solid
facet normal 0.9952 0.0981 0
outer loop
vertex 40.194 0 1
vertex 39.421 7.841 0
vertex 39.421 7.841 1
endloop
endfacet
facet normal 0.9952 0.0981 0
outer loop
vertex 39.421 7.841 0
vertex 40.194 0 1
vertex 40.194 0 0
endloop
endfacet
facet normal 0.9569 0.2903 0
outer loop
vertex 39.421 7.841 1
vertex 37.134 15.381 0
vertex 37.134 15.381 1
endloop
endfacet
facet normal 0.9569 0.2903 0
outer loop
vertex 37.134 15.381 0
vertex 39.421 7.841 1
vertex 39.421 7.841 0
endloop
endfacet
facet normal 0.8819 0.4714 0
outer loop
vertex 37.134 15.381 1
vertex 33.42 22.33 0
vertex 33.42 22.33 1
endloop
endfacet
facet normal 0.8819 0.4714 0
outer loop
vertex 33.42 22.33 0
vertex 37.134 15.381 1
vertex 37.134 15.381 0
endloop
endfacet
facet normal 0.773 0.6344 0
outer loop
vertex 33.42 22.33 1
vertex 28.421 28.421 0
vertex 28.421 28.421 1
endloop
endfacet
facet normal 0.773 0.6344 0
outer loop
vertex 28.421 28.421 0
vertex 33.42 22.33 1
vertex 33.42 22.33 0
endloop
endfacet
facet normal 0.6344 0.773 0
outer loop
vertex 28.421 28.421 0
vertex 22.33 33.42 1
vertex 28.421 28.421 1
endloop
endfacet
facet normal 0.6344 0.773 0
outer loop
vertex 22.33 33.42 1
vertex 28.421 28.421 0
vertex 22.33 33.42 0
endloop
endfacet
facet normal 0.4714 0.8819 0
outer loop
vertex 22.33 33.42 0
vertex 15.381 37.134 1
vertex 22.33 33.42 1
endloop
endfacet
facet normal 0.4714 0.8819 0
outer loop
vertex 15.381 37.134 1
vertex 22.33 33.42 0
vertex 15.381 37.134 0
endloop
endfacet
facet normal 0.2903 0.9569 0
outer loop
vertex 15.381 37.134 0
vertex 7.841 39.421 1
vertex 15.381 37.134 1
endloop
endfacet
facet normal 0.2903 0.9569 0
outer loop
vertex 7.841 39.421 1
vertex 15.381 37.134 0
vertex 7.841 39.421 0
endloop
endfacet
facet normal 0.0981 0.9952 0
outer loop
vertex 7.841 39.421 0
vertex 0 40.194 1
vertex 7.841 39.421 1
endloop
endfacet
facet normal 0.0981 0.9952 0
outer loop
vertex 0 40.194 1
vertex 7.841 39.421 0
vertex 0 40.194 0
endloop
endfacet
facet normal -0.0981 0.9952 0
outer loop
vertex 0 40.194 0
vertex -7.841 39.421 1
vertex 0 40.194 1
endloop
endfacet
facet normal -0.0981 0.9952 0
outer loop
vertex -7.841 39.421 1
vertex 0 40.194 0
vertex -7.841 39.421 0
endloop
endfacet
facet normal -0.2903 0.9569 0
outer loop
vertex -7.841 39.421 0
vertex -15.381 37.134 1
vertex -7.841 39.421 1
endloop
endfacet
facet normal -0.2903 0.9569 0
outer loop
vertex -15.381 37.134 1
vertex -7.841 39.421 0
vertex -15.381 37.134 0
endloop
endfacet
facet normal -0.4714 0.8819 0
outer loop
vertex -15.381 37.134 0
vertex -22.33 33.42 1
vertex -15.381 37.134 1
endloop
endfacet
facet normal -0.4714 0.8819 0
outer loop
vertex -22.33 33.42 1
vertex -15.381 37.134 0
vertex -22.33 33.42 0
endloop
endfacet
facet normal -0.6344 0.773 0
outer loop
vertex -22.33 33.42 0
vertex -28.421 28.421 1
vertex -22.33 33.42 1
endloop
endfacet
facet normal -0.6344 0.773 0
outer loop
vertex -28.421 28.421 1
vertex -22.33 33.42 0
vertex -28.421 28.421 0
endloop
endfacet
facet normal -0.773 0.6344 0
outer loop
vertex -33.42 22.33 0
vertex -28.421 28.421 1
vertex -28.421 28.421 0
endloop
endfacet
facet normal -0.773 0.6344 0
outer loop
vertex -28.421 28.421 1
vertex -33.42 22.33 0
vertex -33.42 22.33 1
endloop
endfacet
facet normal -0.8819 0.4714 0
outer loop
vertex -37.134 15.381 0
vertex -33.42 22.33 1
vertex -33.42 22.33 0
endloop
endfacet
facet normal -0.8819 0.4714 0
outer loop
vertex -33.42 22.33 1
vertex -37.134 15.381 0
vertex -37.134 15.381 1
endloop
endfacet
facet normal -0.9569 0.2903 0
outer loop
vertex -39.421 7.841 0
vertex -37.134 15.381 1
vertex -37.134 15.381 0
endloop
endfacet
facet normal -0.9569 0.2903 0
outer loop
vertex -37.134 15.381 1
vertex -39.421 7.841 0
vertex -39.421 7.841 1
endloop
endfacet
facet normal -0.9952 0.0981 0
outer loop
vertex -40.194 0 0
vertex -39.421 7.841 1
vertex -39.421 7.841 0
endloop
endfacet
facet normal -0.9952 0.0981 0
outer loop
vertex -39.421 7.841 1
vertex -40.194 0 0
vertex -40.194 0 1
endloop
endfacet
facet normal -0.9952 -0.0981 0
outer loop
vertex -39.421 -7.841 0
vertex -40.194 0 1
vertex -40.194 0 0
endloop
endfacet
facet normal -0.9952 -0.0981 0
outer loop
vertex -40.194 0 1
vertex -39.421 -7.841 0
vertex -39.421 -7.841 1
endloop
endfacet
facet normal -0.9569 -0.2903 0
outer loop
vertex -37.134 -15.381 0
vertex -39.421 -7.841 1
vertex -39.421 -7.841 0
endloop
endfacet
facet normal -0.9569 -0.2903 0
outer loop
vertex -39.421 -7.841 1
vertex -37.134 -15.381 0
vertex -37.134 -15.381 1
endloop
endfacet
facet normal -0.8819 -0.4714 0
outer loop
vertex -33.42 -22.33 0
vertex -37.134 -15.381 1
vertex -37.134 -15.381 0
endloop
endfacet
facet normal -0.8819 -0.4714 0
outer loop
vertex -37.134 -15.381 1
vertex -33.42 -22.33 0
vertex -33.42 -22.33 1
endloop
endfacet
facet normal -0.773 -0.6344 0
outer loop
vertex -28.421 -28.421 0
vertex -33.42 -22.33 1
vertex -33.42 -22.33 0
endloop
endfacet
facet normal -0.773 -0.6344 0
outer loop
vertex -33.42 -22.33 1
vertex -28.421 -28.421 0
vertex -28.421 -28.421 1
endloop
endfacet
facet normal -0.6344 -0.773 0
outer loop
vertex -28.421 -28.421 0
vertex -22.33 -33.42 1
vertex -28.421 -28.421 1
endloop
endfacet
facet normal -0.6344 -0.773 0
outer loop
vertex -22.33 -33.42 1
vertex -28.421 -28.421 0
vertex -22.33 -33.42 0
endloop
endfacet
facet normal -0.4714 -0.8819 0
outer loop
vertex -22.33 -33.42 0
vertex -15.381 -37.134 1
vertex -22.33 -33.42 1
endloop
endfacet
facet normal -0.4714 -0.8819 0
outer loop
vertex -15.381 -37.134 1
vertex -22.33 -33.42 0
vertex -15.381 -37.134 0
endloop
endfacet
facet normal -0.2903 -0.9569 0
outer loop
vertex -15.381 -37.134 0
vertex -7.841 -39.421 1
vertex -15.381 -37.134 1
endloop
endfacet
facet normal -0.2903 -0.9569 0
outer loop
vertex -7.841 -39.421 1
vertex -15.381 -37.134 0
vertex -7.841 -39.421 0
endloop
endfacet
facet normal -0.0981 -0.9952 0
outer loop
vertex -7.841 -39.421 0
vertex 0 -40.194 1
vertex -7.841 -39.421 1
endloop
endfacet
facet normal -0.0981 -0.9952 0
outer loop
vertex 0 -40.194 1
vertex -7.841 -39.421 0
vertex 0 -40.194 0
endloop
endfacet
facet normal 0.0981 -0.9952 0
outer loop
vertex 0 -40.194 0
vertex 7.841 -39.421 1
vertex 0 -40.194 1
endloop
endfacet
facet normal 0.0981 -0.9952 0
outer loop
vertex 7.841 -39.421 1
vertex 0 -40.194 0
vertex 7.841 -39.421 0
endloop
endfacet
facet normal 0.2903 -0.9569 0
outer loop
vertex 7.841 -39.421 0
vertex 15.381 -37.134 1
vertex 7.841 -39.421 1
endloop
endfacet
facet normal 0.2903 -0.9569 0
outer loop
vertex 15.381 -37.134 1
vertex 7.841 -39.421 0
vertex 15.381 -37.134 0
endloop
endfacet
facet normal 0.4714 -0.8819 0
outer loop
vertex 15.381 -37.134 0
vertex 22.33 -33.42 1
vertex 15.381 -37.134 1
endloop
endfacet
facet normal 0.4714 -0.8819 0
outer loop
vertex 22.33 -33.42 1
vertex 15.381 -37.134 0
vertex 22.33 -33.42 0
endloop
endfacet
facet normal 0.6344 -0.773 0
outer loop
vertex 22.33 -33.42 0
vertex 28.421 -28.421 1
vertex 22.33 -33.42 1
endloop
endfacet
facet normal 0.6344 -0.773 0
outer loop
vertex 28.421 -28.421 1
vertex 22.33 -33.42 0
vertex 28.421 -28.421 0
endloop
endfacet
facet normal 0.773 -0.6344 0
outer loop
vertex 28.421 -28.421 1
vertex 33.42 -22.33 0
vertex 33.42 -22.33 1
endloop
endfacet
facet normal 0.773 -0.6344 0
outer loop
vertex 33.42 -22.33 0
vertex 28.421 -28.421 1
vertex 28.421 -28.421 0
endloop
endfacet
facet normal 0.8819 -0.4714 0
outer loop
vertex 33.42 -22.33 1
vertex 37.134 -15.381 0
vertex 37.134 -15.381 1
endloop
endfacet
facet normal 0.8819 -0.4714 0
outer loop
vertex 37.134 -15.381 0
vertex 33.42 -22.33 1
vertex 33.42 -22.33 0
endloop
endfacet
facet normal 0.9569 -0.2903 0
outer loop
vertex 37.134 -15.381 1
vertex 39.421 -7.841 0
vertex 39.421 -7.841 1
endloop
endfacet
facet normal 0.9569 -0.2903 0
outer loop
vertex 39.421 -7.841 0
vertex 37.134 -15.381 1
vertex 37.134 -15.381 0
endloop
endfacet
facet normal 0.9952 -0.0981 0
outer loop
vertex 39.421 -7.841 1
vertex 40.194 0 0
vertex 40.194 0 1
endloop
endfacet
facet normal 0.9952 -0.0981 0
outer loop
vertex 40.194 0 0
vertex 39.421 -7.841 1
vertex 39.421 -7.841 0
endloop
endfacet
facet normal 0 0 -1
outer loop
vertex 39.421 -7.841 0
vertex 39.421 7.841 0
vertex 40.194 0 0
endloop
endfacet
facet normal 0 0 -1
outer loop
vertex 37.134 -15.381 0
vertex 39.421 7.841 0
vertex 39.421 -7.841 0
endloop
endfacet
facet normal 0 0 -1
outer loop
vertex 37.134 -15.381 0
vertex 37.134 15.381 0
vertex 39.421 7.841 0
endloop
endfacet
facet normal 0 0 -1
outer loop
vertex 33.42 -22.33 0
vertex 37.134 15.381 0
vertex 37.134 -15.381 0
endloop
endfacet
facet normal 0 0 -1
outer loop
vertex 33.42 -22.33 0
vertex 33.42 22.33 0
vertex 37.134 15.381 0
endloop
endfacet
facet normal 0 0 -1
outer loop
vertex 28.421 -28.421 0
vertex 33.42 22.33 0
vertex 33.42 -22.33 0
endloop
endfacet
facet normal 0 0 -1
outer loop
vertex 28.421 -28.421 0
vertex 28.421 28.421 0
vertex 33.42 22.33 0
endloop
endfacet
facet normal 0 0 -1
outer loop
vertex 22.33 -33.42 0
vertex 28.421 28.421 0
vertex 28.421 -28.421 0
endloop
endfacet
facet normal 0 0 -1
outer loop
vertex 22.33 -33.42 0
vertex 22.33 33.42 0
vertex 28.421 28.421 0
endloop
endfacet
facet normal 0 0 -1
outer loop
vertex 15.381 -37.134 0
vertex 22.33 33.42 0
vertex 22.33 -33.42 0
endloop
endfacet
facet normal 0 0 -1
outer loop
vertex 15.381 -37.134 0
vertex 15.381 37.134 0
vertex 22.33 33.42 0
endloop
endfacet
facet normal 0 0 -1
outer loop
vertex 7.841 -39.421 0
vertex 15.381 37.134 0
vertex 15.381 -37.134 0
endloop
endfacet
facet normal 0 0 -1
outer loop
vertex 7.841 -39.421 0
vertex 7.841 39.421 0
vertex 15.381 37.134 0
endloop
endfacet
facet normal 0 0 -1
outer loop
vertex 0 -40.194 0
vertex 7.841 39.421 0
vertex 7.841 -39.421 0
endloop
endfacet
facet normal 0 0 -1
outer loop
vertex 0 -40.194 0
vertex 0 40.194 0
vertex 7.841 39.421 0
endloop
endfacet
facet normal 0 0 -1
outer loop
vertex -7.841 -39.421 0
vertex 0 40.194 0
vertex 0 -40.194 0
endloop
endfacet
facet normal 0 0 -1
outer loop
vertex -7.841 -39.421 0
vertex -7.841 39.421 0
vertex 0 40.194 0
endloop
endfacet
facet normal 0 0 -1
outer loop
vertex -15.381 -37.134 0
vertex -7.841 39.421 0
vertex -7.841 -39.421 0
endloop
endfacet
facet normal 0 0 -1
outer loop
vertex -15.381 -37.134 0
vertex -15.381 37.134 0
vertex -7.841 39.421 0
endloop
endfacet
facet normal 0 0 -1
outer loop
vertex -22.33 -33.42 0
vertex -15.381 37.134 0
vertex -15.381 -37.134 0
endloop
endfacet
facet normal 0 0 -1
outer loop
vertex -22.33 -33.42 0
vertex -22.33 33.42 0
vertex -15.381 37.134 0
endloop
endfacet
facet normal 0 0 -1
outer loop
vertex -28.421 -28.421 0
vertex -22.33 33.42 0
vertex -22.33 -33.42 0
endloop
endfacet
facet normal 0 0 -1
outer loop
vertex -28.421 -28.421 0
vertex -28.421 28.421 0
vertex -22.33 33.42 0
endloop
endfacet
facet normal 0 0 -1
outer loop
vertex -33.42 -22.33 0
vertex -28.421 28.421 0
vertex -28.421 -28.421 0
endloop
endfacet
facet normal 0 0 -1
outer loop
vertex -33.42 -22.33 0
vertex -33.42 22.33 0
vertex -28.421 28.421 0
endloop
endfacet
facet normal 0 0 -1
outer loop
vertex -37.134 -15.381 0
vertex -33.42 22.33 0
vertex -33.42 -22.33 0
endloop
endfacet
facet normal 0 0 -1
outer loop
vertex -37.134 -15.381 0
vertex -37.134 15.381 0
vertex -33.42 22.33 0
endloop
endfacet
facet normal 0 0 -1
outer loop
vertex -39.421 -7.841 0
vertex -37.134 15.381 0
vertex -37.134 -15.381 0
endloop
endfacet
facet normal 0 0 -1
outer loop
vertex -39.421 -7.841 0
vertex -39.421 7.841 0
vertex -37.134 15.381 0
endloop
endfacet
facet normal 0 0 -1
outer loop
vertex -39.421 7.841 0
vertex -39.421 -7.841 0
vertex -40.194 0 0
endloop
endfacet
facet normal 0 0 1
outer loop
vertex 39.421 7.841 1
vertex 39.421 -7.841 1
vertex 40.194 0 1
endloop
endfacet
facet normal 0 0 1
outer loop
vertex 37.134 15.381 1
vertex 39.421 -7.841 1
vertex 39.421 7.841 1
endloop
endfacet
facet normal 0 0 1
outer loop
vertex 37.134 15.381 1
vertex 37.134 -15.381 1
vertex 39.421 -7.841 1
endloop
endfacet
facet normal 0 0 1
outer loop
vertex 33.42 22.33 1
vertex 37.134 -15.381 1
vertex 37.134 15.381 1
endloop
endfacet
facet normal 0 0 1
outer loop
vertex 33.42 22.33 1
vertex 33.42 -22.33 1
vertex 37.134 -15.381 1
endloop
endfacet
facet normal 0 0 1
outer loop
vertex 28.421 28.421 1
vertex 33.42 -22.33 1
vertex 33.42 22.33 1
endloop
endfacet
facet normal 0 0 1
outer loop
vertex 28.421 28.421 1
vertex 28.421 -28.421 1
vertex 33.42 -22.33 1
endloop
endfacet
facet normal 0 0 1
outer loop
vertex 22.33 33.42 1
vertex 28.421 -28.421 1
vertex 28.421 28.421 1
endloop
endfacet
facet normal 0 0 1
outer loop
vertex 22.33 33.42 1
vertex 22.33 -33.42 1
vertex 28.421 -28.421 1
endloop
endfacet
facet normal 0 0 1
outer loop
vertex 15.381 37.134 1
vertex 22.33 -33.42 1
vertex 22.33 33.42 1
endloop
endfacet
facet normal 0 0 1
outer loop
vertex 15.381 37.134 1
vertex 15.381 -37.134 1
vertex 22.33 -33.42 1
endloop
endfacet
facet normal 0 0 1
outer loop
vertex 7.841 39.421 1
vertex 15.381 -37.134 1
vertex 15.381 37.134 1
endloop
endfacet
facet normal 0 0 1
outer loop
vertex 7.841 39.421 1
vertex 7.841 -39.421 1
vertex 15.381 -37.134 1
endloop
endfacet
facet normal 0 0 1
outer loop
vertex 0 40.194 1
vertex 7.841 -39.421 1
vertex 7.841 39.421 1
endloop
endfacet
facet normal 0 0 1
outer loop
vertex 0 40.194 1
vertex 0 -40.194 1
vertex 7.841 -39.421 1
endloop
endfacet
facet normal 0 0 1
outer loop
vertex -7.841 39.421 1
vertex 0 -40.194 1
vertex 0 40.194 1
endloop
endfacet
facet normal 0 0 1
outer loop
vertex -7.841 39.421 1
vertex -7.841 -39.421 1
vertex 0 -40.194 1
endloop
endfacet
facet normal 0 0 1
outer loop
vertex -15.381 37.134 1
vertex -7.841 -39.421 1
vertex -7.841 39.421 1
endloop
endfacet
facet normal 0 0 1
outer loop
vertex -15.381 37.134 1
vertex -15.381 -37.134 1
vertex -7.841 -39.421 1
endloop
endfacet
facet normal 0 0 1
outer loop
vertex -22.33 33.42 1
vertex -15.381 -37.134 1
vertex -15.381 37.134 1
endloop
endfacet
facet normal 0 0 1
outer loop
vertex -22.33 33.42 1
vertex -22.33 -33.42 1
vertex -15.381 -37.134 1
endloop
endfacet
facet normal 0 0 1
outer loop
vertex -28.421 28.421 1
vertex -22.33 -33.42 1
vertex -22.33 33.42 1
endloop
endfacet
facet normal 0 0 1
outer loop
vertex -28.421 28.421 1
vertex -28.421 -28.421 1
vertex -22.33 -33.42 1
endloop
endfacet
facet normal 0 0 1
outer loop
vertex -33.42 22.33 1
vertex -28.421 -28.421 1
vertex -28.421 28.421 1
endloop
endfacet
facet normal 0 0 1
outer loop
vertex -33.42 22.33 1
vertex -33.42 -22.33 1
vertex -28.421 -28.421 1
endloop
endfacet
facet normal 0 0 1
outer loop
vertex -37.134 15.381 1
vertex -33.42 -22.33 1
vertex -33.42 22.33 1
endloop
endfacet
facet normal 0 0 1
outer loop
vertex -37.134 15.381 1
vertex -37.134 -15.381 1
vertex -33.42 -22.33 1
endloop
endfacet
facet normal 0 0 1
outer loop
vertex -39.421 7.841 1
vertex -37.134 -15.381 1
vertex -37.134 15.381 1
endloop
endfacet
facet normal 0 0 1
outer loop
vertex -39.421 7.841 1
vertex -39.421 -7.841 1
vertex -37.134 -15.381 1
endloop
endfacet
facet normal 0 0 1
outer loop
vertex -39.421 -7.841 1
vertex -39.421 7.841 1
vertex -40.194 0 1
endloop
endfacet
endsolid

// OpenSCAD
//

cylinder2(height = 1,radius = 40,fn = 32);
module cylinder2(height = 1,radius = 1,fn = 30){
   fudge = 1/cos(180/fn);
    echo(radius*fudge, fudge);
   cylinder(h=height,r=radius*fudge,$fn=fn);
}
